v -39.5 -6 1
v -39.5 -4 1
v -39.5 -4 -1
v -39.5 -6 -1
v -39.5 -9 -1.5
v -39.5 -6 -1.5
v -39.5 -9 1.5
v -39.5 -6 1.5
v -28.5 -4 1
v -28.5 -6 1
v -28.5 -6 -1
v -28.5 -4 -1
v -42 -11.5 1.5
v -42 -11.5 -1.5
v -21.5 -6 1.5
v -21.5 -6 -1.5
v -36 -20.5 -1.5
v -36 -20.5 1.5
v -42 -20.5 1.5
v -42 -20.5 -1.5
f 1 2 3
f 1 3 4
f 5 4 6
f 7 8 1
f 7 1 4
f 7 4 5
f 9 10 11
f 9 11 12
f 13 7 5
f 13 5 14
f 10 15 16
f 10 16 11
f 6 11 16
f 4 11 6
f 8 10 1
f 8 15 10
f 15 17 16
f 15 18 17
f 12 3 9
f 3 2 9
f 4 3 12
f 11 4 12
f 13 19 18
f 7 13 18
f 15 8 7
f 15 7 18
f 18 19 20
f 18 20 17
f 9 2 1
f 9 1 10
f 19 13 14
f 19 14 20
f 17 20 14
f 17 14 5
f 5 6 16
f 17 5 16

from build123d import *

# Parameters (mm, degrees)
BOSS_EXTRUDE1_DEPTH = 1.5
SKETCH1_4_W         = 11
SKETCH1_4_H         = 2
BOSS_EXTRUDE2_DEPTH = 1


with BuildPart() as part:
    # Sketch1 → Boss-Extrude1 (new, symmetric)
    with BuildSketch(Plane.XY):
        Polygon((-28.5, -6), (-39.5, -6), (-39.5, -9), (-42, -11.5), (-42, -20.5), (-36, -20.5), (-24.008925726, -8.508925726), (-21.5, -6), align=None)
    extrude(amount=BOSS_EXTRUDE1_DEPTH, both=True)

    # Sketch1<4> → Boss-Extrude2 (add, symmetric)
    with BuildSketch(Plane.XY):
        with Locations((-34, -5)):
            Rectangle(SKETCH1_4_W, SKETCH1_4_H)
    extrude(amount=BOSS_EXTRUDE2_DEPTH, both=True)


solid = part.part
